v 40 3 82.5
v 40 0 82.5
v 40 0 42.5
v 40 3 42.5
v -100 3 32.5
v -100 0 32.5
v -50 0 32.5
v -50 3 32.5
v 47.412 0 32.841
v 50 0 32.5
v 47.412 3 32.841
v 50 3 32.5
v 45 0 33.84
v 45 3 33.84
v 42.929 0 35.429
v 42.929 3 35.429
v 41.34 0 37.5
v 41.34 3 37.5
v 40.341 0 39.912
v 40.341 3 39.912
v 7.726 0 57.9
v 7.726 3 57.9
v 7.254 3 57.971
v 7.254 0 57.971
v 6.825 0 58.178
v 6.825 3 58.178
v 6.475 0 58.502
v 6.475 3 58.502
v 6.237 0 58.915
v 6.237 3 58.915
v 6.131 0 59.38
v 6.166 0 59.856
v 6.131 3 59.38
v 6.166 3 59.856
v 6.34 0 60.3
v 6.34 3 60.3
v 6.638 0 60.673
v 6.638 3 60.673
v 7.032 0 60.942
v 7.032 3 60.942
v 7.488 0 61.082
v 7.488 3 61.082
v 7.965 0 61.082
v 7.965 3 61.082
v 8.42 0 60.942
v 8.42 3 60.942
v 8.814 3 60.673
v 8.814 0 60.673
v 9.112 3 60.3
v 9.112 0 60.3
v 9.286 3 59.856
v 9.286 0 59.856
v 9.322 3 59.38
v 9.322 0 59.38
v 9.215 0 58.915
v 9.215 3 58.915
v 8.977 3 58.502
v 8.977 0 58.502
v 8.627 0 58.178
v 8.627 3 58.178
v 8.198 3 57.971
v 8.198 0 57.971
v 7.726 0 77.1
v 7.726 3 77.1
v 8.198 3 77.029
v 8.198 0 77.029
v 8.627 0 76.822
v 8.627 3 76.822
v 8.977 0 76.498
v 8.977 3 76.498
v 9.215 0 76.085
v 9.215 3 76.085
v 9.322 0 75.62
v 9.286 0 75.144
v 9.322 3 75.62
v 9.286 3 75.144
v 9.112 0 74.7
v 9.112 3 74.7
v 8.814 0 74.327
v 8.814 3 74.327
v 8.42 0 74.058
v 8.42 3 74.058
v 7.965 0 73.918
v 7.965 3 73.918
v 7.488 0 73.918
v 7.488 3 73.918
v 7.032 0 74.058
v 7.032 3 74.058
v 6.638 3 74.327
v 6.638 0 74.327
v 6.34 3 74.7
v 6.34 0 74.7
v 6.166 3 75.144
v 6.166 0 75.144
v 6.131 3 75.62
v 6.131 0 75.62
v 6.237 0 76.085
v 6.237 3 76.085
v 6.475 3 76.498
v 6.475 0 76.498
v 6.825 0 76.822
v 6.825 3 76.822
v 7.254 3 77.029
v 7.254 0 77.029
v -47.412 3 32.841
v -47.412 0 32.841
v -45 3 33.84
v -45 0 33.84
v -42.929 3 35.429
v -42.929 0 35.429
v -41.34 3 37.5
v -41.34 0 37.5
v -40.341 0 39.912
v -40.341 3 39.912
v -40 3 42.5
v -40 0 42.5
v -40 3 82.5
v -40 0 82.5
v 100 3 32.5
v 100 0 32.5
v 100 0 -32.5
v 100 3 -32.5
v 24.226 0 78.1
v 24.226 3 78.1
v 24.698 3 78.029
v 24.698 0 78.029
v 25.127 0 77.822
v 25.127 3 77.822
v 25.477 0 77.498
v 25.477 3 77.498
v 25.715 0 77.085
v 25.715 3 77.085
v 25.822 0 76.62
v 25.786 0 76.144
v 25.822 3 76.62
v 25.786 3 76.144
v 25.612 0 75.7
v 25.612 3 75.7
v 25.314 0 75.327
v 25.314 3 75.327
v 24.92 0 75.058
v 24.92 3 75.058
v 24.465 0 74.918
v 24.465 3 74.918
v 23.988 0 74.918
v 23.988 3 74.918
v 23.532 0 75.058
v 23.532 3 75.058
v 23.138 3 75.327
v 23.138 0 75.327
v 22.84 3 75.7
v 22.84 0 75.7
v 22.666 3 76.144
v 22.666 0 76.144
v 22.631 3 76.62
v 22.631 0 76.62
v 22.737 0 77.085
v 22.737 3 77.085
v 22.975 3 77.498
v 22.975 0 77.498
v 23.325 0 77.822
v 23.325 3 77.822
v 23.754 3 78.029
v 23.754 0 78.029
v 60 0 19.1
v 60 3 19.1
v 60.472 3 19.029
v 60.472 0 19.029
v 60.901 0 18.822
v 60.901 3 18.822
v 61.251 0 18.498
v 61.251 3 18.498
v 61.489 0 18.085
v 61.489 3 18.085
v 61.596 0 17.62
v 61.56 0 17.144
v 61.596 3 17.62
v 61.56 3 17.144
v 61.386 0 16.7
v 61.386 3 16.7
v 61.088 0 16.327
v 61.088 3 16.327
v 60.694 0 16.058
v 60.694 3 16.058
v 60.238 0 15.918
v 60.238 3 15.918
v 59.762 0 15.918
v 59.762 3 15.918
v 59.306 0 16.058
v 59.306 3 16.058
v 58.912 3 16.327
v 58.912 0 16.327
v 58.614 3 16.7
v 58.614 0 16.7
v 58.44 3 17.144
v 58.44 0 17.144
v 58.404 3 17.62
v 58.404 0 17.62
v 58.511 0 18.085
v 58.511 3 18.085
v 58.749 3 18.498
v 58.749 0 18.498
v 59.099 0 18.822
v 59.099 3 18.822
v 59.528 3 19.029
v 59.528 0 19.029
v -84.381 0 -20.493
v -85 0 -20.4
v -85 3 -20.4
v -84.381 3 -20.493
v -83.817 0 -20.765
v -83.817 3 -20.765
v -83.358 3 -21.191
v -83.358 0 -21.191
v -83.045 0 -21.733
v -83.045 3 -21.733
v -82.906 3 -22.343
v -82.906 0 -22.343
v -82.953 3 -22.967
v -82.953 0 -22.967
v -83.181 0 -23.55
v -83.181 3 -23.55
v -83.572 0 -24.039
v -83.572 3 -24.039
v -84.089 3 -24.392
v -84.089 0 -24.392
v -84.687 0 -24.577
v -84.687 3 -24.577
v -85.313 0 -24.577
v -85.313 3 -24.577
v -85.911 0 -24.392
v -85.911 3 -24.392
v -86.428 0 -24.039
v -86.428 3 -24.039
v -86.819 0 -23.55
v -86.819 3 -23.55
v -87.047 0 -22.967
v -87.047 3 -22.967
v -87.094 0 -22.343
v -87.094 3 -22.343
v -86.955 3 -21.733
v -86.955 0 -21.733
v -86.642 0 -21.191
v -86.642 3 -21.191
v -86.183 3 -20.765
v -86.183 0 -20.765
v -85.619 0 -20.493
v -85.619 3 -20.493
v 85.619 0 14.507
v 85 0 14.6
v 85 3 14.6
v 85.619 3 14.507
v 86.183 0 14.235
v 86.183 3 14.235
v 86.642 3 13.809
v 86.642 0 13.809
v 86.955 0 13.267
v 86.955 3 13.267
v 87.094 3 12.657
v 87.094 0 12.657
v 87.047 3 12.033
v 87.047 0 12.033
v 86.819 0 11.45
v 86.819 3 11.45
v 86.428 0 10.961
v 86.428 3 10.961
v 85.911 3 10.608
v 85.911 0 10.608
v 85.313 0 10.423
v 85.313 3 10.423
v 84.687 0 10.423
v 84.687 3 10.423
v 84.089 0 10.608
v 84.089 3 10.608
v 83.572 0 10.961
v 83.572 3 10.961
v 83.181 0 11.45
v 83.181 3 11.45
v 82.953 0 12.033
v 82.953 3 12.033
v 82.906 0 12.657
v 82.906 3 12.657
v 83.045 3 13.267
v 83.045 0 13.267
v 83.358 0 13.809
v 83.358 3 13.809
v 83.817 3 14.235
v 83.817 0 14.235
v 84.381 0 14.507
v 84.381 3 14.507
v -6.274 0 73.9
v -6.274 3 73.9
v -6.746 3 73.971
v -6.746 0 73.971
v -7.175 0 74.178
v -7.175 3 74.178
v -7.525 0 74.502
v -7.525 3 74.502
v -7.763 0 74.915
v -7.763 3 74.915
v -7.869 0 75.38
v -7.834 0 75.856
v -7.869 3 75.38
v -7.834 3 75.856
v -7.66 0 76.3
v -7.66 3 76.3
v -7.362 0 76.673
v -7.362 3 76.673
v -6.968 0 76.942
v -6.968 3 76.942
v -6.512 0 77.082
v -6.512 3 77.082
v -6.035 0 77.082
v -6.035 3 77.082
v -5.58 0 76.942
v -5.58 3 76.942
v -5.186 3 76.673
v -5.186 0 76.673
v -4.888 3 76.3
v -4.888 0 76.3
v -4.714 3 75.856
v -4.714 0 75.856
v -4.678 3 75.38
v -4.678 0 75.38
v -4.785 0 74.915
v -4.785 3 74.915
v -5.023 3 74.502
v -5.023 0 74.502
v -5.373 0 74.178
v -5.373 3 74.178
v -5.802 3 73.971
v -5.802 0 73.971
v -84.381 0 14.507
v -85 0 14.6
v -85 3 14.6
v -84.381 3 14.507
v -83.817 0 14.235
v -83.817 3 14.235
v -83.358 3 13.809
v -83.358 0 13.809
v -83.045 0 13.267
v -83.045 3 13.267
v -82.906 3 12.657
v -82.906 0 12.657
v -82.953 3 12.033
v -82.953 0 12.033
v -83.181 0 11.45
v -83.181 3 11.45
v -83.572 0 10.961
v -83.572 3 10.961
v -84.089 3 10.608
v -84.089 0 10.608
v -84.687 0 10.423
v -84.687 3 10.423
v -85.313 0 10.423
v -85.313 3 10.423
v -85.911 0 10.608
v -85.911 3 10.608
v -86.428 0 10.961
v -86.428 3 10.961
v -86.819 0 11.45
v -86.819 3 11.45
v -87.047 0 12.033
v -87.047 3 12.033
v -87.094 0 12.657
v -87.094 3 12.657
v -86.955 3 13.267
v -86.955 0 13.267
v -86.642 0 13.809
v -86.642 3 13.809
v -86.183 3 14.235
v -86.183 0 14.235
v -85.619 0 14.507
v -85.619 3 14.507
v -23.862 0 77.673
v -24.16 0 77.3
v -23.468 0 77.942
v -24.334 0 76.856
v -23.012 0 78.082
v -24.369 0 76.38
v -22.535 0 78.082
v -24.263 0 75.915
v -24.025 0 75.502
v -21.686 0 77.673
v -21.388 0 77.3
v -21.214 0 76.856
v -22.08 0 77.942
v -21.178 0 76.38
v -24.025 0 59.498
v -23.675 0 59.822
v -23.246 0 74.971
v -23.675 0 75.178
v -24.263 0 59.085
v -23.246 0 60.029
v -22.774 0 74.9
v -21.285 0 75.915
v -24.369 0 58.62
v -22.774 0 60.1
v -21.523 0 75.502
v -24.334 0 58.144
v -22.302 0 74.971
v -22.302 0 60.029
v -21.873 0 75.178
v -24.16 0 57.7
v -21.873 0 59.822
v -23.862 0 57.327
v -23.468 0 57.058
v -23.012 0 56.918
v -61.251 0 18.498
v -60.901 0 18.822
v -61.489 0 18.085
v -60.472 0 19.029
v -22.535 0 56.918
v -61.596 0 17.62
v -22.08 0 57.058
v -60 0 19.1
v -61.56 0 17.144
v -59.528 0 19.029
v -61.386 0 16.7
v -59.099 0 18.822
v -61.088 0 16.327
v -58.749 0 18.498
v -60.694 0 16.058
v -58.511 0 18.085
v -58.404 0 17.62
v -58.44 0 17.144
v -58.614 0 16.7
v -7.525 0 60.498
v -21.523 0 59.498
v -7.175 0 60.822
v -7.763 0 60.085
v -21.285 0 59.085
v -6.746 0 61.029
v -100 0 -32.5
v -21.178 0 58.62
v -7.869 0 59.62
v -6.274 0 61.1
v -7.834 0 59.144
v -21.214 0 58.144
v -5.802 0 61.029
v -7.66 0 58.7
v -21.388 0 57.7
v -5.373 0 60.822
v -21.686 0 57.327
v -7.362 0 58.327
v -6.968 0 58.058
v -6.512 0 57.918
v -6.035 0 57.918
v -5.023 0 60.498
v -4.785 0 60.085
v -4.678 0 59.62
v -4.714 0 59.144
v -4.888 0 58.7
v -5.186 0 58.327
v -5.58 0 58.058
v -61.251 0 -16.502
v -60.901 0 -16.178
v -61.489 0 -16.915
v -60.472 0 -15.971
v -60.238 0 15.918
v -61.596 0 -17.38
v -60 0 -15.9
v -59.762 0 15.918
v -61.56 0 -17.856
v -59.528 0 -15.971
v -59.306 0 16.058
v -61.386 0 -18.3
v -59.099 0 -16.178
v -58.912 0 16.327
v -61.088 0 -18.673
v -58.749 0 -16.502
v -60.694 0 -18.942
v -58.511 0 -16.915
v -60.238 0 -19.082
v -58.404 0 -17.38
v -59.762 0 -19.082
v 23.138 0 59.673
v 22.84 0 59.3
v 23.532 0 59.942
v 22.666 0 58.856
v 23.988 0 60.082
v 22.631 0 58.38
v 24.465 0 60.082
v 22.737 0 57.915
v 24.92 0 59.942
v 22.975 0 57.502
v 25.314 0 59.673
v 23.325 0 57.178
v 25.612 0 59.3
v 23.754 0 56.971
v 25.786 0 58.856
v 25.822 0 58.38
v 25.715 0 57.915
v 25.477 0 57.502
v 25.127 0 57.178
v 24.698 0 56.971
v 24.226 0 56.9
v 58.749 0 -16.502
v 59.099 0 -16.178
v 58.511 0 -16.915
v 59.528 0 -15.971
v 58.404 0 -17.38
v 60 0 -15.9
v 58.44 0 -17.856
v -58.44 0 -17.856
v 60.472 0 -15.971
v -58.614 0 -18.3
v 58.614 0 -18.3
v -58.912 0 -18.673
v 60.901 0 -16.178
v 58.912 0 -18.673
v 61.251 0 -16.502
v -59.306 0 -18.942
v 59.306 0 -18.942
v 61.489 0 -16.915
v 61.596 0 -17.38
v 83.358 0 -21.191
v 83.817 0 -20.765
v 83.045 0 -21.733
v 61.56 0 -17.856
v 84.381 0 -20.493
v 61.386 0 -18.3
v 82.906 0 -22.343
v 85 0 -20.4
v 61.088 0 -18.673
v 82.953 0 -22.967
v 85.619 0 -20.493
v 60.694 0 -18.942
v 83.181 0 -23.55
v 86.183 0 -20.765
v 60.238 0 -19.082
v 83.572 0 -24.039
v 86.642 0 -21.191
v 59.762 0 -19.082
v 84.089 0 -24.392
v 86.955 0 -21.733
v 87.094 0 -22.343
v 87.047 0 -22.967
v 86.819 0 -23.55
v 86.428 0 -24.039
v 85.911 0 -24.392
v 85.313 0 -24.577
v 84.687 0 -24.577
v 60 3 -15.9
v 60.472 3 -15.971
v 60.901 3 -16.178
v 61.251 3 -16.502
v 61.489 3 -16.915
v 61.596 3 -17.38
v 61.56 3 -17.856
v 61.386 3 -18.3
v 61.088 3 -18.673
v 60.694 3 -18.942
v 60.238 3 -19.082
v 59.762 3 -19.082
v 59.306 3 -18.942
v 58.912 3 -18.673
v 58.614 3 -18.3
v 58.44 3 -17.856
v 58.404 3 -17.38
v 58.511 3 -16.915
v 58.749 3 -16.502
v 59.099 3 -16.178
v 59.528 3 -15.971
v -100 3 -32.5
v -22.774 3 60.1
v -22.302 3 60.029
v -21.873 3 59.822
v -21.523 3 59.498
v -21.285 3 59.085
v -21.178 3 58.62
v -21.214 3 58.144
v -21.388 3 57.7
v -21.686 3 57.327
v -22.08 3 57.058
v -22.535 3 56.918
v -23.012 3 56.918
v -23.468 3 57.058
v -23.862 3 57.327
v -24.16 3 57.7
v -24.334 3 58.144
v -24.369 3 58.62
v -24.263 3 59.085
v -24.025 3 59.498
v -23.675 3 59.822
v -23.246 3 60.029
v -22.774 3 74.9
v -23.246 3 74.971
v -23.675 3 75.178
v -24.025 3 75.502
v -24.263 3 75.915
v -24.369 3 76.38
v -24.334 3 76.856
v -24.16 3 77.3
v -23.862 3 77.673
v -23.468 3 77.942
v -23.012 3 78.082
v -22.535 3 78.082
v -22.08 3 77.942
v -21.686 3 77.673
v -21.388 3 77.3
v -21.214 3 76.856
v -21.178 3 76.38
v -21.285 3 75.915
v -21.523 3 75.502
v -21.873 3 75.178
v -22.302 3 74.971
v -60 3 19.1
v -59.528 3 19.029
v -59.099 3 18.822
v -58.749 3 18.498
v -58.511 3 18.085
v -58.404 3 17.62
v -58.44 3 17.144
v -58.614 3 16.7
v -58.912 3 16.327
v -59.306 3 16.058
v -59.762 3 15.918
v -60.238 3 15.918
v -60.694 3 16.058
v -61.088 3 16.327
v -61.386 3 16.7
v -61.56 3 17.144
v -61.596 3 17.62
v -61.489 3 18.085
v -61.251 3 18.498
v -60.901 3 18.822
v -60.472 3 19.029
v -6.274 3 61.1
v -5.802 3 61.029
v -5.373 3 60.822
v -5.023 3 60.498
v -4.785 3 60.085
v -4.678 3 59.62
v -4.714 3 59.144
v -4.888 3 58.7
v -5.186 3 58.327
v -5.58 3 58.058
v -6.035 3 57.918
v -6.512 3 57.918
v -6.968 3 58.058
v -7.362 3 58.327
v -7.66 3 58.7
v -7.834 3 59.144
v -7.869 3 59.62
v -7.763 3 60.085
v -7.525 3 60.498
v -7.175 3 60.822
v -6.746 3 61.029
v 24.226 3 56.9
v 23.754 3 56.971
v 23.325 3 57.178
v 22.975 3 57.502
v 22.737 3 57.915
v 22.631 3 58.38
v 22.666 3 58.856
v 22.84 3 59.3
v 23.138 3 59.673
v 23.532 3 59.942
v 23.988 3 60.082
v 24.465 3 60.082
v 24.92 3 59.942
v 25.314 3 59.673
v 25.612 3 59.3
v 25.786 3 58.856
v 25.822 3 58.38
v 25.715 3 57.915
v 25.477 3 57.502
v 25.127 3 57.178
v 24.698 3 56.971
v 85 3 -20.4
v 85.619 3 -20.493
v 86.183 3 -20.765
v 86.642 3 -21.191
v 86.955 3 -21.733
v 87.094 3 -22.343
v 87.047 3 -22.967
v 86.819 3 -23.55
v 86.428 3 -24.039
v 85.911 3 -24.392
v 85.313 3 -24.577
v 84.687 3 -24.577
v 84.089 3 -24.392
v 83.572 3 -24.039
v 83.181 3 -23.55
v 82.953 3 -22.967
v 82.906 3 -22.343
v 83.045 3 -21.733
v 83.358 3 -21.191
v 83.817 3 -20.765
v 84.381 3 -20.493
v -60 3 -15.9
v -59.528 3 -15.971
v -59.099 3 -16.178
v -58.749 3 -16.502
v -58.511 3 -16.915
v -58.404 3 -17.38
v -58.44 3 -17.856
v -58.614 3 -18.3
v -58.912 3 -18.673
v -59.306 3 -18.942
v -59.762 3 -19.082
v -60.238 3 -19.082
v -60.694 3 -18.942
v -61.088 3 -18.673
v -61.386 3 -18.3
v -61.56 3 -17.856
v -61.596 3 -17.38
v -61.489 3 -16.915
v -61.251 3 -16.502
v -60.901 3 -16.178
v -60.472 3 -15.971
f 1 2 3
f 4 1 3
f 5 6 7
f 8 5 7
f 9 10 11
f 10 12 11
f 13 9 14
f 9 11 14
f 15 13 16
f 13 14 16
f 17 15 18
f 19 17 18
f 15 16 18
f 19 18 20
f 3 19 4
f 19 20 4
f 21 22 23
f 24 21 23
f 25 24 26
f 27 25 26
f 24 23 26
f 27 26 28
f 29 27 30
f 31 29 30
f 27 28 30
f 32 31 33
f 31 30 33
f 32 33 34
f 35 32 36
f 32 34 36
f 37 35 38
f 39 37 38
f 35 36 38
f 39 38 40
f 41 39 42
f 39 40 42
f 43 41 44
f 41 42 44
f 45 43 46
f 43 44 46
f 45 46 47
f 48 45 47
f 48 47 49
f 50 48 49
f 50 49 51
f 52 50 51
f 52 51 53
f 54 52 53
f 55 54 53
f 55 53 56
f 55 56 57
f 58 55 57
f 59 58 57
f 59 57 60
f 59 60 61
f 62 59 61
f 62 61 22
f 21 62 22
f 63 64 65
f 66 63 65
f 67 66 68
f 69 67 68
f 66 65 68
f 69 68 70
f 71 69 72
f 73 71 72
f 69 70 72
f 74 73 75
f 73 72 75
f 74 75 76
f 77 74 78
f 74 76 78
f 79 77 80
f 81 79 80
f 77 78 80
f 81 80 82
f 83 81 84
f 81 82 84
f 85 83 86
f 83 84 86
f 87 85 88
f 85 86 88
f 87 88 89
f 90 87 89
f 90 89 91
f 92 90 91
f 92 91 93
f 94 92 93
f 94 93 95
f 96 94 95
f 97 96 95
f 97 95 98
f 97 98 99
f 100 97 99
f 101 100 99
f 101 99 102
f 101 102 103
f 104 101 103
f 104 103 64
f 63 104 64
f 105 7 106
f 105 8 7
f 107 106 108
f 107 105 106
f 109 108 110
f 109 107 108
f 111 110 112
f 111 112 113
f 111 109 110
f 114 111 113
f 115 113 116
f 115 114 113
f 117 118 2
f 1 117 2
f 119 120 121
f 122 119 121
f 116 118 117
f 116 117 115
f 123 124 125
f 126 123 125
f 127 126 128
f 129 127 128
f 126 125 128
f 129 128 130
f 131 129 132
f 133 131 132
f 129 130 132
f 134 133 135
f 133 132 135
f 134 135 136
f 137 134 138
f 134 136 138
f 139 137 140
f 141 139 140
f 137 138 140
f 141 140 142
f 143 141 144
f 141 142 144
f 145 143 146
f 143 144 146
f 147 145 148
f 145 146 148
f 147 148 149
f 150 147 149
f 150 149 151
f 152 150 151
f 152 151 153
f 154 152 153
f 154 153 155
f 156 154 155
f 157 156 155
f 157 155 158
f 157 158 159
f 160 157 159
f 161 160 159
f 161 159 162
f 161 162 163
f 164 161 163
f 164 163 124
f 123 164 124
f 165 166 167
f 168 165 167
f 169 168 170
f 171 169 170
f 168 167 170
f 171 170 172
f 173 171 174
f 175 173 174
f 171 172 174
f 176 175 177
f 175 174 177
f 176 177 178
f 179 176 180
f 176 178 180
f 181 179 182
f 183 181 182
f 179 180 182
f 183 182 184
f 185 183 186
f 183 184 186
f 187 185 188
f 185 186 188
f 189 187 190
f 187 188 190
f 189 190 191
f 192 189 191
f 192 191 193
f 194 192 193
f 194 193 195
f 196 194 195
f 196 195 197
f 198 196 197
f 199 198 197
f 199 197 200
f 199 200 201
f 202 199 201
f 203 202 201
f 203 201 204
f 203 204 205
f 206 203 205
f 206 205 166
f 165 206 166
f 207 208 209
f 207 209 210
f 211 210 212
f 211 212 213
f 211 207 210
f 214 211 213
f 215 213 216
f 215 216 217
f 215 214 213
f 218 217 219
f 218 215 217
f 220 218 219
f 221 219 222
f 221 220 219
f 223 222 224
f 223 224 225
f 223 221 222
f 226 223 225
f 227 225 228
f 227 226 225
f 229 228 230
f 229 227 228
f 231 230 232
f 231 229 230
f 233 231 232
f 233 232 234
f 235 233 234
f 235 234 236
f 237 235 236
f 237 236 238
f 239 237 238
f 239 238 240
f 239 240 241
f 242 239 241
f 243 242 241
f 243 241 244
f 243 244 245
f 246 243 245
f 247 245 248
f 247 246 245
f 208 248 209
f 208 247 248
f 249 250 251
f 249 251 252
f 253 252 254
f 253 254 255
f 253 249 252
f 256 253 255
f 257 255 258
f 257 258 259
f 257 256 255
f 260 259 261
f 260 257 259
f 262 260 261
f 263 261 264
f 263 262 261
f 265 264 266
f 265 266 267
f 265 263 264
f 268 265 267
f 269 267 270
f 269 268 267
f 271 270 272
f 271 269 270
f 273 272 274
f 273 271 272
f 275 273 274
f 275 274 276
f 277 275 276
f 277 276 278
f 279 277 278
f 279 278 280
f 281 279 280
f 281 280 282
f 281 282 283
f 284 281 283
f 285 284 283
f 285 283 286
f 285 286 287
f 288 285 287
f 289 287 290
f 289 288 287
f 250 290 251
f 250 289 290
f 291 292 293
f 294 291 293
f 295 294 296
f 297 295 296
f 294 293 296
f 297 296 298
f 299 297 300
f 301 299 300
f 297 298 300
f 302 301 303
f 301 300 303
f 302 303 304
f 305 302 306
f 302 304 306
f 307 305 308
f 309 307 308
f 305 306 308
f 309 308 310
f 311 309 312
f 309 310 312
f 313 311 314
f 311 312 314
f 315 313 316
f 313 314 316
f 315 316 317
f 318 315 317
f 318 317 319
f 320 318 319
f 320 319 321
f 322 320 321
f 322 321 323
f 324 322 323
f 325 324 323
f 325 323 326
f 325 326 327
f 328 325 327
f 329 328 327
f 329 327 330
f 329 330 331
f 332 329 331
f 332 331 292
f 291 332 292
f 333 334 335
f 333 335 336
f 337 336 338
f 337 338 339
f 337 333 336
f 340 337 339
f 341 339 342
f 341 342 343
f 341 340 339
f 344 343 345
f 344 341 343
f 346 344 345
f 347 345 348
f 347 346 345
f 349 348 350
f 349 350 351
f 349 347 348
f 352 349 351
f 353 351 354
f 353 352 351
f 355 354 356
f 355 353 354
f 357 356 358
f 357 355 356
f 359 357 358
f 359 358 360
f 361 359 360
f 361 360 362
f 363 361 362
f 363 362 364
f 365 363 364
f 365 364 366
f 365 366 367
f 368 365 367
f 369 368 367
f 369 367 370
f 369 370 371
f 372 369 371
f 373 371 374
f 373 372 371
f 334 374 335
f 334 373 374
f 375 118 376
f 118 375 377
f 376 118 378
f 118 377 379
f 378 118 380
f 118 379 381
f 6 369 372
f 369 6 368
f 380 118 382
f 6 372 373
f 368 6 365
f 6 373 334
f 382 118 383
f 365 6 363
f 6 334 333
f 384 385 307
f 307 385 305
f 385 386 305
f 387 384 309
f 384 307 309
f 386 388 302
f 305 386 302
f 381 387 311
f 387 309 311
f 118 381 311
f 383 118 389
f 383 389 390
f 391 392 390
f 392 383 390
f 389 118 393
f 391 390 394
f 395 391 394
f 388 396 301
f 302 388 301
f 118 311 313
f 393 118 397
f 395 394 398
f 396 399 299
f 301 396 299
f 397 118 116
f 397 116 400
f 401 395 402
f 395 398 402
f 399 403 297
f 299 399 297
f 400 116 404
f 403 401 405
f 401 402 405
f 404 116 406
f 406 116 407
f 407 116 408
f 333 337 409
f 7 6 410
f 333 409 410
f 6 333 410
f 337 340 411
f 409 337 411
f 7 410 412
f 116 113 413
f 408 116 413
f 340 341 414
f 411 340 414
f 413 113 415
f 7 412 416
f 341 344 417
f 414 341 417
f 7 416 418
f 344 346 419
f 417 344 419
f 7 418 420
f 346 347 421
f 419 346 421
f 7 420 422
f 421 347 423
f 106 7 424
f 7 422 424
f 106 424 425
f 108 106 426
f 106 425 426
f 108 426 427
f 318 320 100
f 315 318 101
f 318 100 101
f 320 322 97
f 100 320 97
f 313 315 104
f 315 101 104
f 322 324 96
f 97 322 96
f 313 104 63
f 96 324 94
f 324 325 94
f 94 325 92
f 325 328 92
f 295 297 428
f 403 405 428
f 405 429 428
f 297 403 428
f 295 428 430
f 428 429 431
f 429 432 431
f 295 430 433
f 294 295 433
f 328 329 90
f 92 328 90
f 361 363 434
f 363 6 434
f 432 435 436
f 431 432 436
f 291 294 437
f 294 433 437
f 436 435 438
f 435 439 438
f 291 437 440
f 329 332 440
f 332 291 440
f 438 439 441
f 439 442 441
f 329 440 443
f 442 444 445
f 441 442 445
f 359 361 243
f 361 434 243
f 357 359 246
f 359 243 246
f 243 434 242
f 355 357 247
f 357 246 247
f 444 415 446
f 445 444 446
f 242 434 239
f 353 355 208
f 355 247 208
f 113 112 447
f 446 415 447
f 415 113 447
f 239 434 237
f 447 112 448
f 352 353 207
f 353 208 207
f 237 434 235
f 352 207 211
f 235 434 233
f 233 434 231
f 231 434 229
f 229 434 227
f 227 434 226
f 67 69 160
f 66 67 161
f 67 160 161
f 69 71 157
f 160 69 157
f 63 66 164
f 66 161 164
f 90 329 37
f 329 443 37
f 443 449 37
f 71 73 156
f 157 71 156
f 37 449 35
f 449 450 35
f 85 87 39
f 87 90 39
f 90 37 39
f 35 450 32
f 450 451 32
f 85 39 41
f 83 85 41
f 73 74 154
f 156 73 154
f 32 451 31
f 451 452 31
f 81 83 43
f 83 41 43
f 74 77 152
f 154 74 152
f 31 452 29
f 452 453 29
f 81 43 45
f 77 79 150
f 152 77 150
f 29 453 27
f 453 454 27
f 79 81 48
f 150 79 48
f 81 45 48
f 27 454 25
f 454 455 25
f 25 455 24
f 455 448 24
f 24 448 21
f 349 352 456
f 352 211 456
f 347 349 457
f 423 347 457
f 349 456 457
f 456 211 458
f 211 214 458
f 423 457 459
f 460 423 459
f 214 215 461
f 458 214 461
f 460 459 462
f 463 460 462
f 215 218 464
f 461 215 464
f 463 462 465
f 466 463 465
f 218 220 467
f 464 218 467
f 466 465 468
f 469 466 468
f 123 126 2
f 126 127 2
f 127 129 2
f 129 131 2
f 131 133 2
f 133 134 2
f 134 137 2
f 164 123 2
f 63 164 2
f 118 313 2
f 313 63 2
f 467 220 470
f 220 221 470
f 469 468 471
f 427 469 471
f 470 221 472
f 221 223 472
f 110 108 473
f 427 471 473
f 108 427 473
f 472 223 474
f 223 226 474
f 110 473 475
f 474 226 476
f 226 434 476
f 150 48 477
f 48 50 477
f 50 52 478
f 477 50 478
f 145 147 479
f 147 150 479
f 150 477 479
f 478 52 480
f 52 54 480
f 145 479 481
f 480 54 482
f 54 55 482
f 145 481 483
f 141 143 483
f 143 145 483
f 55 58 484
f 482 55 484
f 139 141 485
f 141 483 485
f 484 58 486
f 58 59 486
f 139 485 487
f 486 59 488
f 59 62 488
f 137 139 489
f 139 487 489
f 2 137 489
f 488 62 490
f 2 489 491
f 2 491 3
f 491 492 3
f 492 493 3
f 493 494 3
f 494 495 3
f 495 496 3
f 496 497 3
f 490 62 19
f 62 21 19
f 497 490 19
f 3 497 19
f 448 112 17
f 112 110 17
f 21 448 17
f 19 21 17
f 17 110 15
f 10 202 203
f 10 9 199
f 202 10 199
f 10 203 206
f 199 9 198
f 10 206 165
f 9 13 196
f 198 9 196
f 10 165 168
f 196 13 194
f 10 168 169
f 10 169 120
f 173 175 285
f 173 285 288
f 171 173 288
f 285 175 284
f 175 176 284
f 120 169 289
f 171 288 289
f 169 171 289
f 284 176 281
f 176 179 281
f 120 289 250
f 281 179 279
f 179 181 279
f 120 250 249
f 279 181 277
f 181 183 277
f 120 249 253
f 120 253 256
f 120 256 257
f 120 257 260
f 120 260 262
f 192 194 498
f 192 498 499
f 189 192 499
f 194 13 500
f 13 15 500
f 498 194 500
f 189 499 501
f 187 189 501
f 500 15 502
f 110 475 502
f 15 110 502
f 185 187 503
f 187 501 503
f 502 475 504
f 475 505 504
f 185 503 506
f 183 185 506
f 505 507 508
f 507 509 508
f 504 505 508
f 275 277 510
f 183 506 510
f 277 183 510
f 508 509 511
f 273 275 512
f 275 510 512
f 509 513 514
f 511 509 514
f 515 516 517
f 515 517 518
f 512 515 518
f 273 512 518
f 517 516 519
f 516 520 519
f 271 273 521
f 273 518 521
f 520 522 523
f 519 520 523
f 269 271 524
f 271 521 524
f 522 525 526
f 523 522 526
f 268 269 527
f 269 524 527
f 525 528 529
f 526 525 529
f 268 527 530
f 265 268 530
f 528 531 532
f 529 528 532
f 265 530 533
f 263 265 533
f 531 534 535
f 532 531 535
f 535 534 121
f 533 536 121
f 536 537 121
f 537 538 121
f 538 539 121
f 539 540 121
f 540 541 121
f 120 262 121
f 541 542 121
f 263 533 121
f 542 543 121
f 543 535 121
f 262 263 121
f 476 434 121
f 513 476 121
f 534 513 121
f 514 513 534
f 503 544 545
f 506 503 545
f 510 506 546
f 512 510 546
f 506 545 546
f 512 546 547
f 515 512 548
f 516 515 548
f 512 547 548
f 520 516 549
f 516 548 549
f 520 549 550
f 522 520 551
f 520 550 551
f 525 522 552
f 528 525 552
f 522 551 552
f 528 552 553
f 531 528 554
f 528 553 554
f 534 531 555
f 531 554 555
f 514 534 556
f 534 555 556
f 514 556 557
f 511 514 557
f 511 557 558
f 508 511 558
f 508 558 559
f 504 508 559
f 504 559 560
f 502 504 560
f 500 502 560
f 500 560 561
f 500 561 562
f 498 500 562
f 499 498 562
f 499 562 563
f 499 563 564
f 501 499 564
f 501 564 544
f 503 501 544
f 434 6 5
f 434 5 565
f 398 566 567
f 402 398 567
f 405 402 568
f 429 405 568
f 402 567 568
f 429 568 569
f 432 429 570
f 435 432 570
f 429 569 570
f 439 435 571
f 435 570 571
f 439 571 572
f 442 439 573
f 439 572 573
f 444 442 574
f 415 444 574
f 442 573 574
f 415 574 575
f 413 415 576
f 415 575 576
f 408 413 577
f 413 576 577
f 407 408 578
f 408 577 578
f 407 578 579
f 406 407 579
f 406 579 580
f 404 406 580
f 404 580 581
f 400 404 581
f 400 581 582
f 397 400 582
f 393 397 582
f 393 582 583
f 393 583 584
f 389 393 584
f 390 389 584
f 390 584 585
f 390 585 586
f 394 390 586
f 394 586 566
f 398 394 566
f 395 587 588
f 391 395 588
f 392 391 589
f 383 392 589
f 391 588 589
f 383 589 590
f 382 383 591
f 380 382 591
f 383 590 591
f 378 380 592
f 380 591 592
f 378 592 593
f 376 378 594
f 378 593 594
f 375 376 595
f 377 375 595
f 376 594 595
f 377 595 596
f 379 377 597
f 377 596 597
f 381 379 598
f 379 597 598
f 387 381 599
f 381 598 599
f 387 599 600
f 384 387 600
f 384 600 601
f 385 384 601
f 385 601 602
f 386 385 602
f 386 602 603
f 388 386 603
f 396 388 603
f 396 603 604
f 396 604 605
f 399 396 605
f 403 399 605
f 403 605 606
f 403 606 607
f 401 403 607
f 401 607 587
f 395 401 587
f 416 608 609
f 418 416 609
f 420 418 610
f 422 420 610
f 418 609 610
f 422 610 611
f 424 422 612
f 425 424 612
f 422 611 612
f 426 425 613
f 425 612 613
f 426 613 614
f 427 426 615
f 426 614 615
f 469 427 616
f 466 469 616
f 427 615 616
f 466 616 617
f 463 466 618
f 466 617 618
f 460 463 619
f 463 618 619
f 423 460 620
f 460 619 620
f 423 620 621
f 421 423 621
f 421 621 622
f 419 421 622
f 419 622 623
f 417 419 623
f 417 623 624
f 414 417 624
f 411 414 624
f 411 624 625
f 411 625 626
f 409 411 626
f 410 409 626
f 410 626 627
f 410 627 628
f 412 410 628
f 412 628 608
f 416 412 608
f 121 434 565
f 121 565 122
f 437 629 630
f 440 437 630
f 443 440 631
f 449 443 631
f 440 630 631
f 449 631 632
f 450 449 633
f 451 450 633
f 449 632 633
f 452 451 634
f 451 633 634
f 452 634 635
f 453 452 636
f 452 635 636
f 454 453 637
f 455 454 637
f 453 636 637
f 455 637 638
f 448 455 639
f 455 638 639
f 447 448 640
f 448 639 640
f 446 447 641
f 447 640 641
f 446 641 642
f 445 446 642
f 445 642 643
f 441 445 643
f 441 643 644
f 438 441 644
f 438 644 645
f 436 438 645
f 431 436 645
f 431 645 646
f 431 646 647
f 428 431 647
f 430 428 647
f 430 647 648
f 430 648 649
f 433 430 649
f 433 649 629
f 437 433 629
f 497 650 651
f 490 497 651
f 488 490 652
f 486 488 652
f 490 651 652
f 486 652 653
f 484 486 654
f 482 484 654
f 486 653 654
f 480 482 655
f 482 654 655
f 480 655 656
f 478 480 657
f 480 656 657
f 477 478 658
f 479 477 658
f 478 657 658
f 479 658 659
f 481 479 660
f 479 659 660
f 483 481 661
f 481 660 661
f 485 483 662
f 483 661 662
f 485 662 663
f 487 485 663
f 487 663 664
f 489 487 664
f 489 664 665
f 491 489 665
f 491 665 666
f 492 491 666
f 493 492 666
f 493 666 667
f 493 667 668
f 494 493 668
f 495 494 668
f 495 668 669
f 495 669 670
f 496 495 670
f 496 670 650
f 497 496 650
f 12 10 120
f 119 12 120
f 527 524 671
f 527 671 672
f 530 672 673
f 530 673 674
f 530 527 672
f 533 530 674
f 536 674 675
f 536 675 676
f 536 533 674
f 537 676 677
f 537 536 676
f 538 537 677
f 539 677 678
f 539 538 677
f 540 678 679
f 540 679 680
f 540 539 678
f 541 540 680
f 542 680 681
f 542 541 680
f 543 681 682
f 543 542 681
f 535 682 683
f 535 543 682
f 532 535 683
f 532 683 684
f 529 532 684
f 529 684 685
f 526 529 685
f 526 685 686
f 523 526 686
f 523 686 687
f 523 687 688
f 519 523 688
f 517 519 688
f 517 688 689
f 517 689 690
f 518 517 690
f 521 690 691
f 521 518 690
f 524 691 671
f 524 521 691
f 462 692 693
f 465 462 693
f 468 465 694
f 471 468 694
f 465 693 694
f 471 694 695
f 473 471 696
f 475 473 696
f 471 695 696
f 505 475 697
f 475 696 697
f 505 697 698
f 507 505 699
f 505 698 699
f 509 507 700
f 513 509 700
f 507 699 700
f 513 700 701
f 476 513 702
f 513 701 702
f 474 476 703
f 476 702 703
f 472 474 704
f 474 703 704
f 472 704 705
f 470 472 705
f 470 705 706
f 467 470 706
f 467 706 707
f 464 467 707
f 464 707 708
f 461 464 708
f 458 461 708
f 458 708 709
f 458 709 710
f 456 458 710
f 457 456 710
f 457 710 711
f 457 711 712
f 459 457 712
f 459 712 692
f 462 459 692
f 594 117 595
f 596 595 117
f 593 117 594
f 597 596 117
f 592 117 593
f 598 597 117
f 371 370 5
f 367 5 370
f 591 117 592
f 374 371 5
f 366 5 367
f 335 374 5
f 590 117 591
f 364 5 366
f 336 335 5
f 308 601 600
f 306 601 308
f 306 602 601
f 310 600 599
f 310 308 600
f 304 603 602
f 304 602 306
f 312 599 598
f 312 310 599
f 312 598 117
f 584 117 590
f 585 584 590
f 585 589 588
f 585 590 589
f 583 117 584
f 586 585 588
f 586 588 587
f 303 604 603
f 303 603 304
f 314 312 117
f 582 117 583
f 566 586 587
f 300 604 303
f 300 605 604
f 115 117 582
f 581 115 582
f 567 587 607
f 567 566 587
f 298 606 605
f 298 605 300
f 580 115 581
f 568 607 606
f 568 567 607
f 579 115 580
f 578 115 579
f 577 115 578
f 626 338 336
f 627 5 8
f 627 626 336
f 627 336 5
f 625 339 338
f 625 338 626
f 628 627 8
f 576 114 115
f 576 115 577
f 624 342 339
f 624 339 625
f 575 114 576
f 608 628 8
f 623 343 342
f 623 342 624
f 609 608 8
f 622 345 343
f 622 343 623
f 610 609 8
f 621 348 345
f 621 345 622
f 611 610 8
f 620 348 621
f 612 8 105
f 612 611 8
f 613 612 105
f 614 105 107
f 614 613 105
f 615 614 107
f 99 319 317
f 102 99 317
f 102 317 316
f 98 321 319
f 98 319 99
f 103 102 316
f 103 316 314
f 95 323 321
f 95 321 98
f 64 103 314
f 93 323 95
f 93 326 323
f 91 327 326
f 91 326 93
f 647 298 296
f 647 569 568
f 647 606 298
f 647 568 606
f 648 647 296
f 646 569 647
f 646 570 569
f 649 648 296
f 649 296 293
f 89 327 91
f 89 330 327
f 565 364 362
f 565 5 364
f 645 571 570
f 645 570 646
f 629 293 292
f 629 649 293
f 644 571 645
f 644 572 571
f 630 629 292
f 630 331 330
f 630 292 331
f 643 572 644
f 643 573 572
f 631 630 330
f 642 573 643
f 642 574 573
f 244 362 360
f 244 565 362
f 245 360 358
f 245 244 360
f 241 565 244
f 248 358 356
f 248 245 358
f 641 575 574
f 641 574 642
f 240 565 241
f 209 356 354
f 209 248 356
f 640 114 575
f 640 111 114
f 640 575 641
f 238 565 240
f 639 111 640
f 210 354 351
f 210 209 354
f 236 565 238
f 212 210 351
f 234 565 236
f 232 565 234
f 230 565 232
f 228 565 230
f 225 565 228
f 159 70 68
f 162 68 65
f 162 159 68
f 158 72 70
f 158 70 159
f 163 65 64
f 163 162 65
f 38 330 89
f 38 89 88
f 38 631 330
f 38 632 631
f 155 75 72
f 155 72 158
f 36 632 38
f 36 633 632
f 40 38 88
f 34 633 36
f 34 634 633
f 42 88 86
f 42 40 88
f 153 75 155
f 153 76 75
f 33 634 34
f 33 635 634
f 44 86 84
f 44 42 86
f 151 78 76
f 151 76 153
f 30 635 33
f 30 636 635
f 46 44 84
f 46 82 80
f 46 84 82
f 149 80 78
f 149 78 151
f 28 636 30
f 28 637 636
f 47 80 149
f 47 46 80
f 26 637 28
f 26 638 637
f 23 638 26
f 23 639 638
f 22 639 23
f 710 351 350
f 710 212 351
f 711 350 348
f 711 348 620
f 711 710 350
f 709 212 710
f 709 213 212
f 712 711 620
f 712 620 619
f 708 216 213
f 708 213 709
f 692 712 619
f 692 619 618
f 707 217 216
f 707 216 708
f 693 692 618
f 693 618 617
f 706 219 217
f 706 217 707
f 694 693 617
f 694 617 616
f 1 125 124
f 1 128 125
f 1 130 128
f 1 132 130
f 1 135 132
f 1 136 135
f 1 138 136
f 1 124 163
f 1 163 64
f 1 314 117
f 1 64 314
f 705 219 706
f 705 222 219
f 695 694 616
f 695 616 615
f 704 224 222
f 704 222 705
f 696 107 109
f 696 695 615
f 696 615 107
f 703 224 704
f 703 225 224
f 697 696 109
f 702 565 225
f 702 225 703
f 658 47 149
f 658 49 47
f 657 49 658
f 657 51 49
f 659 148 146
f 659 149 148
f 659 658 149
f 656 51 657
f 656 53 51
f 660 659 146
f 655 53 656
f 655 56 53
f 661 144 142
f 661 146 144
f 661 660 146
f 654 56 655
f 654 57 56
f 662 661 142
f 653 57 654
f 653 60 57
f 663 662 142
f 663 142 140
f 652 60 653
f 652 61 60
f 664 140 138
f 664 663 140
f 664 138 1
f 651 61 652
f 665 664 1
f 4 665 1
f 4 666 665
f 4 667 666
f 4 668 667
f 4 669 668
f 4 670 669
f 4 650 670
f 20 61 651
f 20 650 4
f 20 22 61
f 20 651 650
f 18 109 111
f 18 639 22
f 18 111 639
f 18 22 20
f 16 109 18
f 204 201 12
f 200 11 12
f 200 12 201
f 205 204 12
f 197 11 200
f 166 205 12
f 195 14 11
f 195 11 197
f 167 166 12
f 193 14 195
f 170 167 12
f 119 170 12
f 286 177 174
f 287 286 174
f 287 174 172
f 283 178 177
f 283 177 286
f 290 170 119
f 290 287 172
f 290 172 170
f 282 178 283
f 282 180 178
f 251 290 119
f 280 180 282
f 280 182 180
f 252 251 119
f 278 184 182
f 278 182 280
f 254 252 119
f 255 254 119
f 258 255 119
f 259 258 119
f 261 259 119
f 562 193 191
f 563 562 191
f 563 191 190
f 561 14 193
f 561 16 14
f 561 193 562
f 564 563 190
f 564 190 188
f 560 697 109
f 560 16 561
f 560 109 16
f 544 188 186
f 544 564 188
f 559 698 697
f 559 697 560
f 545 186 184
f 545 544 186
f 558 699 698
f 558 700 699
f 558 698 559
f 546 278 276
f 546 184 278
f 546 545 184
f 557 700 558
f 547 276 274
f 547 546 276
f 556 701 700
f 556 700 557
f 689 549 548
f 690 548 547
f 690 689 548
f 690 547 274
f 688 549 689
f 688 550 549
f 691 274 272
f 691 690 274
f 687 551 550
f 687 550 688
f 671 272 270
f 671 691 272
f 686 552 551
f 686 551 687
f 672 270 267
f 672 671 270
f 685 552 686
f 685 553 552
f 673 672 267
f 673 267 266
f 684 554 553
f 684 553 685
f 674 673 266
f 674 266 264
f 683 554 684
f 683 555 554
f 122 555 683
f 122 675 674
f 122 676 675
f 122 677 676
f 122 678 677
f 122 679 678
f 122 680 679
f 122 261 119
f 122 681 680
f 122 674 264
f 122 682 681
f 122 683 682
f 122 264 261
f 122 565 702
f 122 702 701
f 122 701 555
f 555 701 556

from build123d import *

# Parameters (mm, degrees)
SKETCH_1_W             = 200
SKETCH_1_H             = 65
SKETCH_1_R             = 2.1
SKETCH_1_W_2           = 80
SKETCH_1_H_2           = 50
EXTRUDE_1_DEPTH        = 3
SKETCH_2_R             = 1.6
CUT_EXTRUDE_1454_DEPTH = 130.673628776
SKETCH_3_R             = 1.6
CUT_EXTRUDE_2001_DEPTH = 130.673628776
FILLET_1_R             = 10


with BuildPart() as part:
    # 草图1 → 凸台-拉伸1 (new body)
    # profile 1 of 2: a face of its own
    with BuildSketch(Plane(origin=(0, 0, 0), x_dir=(1, 0, 0), z_dir=(0, 1, 0))):
        Rectangle(SKETCH_1_W, SKETCH_1_H)
        with Locations(Location((85, -12.5, 0), (0, 0, 270))):
            Circle(SKETCH_1_R, mode=Mode.SUBTRACT)
        with Locations(Location((-85, -12.5, 0), (0, 0, 270))):
            Circle(SKETCH_1_R, mode=Mode.SUBTRACT)
        with Locations(Location((-85, 22.5, 0), (0, 0, 270))):
            Circle(SKETCH_1_R, mode=Mode.SUBTRACT)
        with Locations(Location((85, 22.5, 0), (0, 0, 270))):
            Circle(SKETCH_1_R, mode=Mode.SUBTRACT)
    # profile 2 of 2: a face of its own
    with BuildSketch(Plane(origin=(0, 0, 0), x_dir=(1, 0, 0), z_dir=(0, 1, 0))):
        with Locations((0, -57.5)):
            Rectangle(SKETCH_1_W_2, SKETCH_1_H_2)
    extrude(amount=EXTRUDE_1_DEPTH)

    # 草图2 → Cut-Extrude 1454 (cut, through all)
    with BuildSketch(Plane(origin=(0, 3, 0), x_dir=(1, 0, 0), z_dir=(0, 1, 0))):
        with Locations(Location((-60, 17.5, 0), (0, 0, 270))):
            Circle(SKETCH_2_R)
        with Locations(Location((-60, -17.5, 0), (0, 0, 270))):
            Circle(SKETCH_2_R)
        with Locations(Location((60, -17.5, 0), (0, 0, 270))):
            Circle(SKETCH_2_R)
        with Locations(Location((60, 17.5, 0), (0, 0, 270))):
            Circle(SKETCH_2_R)
    extrude(amount=-CUT_EXTRUDE_1454_DEPTH, mode=Mode.SUBTRACT)

    # 草图3 → Cut-Extrude 2001 (cut, through all)
    with BuildSketch(Plane(origin=(0, 3, 0), x_dir=(1, 0, 0), z_dir=(0, 1, 0))):
        with Locations(Location((-22.773937698, -58.5, 0), (0, 0, 270))):
            Circle(SKETCH_3_R)
        with Locations(Location((24.226062302, -58.5, 0), (0, 0, 90))):
            Circle(SKETCH_3_R)
        with Locations(Location((24.226062302, -76.5, 0), (0, 0, 270))):
            Circle(SKETCH_3_R)
        with Locations(Location((-22.773937698, -76.5, 0), (0, 0, 90))):
            Circle(SKETCH_3_R)
        with Locations(Location((-6.273937698, -59.5, 0), (0, 0, 270))):
            Circle(SKETCH_3_R)
        with Locations(Location((7.726062302, -59.5, 0), (0, 0, 90))):
            Circle(SKETCH_3_R)
        with Locations(Location((7.726062302, -75.5, 0), (0, 0, 270))):
            Circle(SKETCH_3_R)
        with Locations(Location((-6.273937698, -75.5, 0), (0, 0, 90))):
            Circle(SKETCH_3_R)
    extrude(amount=-CUT_EXTRUDE_2001_DEPTH, mode=Mode.SUBTRACT)

    # 圆角1
    fillet_1_edges = [part.edges().sort_by_distance(p)[0] for p in [
        (40, 1.5, 32.5),
        (-40, 1.5, 32.5),
    ]]
    fillet(fillet_1_edges, radius=FILLET_1_R)


solid = part.part
